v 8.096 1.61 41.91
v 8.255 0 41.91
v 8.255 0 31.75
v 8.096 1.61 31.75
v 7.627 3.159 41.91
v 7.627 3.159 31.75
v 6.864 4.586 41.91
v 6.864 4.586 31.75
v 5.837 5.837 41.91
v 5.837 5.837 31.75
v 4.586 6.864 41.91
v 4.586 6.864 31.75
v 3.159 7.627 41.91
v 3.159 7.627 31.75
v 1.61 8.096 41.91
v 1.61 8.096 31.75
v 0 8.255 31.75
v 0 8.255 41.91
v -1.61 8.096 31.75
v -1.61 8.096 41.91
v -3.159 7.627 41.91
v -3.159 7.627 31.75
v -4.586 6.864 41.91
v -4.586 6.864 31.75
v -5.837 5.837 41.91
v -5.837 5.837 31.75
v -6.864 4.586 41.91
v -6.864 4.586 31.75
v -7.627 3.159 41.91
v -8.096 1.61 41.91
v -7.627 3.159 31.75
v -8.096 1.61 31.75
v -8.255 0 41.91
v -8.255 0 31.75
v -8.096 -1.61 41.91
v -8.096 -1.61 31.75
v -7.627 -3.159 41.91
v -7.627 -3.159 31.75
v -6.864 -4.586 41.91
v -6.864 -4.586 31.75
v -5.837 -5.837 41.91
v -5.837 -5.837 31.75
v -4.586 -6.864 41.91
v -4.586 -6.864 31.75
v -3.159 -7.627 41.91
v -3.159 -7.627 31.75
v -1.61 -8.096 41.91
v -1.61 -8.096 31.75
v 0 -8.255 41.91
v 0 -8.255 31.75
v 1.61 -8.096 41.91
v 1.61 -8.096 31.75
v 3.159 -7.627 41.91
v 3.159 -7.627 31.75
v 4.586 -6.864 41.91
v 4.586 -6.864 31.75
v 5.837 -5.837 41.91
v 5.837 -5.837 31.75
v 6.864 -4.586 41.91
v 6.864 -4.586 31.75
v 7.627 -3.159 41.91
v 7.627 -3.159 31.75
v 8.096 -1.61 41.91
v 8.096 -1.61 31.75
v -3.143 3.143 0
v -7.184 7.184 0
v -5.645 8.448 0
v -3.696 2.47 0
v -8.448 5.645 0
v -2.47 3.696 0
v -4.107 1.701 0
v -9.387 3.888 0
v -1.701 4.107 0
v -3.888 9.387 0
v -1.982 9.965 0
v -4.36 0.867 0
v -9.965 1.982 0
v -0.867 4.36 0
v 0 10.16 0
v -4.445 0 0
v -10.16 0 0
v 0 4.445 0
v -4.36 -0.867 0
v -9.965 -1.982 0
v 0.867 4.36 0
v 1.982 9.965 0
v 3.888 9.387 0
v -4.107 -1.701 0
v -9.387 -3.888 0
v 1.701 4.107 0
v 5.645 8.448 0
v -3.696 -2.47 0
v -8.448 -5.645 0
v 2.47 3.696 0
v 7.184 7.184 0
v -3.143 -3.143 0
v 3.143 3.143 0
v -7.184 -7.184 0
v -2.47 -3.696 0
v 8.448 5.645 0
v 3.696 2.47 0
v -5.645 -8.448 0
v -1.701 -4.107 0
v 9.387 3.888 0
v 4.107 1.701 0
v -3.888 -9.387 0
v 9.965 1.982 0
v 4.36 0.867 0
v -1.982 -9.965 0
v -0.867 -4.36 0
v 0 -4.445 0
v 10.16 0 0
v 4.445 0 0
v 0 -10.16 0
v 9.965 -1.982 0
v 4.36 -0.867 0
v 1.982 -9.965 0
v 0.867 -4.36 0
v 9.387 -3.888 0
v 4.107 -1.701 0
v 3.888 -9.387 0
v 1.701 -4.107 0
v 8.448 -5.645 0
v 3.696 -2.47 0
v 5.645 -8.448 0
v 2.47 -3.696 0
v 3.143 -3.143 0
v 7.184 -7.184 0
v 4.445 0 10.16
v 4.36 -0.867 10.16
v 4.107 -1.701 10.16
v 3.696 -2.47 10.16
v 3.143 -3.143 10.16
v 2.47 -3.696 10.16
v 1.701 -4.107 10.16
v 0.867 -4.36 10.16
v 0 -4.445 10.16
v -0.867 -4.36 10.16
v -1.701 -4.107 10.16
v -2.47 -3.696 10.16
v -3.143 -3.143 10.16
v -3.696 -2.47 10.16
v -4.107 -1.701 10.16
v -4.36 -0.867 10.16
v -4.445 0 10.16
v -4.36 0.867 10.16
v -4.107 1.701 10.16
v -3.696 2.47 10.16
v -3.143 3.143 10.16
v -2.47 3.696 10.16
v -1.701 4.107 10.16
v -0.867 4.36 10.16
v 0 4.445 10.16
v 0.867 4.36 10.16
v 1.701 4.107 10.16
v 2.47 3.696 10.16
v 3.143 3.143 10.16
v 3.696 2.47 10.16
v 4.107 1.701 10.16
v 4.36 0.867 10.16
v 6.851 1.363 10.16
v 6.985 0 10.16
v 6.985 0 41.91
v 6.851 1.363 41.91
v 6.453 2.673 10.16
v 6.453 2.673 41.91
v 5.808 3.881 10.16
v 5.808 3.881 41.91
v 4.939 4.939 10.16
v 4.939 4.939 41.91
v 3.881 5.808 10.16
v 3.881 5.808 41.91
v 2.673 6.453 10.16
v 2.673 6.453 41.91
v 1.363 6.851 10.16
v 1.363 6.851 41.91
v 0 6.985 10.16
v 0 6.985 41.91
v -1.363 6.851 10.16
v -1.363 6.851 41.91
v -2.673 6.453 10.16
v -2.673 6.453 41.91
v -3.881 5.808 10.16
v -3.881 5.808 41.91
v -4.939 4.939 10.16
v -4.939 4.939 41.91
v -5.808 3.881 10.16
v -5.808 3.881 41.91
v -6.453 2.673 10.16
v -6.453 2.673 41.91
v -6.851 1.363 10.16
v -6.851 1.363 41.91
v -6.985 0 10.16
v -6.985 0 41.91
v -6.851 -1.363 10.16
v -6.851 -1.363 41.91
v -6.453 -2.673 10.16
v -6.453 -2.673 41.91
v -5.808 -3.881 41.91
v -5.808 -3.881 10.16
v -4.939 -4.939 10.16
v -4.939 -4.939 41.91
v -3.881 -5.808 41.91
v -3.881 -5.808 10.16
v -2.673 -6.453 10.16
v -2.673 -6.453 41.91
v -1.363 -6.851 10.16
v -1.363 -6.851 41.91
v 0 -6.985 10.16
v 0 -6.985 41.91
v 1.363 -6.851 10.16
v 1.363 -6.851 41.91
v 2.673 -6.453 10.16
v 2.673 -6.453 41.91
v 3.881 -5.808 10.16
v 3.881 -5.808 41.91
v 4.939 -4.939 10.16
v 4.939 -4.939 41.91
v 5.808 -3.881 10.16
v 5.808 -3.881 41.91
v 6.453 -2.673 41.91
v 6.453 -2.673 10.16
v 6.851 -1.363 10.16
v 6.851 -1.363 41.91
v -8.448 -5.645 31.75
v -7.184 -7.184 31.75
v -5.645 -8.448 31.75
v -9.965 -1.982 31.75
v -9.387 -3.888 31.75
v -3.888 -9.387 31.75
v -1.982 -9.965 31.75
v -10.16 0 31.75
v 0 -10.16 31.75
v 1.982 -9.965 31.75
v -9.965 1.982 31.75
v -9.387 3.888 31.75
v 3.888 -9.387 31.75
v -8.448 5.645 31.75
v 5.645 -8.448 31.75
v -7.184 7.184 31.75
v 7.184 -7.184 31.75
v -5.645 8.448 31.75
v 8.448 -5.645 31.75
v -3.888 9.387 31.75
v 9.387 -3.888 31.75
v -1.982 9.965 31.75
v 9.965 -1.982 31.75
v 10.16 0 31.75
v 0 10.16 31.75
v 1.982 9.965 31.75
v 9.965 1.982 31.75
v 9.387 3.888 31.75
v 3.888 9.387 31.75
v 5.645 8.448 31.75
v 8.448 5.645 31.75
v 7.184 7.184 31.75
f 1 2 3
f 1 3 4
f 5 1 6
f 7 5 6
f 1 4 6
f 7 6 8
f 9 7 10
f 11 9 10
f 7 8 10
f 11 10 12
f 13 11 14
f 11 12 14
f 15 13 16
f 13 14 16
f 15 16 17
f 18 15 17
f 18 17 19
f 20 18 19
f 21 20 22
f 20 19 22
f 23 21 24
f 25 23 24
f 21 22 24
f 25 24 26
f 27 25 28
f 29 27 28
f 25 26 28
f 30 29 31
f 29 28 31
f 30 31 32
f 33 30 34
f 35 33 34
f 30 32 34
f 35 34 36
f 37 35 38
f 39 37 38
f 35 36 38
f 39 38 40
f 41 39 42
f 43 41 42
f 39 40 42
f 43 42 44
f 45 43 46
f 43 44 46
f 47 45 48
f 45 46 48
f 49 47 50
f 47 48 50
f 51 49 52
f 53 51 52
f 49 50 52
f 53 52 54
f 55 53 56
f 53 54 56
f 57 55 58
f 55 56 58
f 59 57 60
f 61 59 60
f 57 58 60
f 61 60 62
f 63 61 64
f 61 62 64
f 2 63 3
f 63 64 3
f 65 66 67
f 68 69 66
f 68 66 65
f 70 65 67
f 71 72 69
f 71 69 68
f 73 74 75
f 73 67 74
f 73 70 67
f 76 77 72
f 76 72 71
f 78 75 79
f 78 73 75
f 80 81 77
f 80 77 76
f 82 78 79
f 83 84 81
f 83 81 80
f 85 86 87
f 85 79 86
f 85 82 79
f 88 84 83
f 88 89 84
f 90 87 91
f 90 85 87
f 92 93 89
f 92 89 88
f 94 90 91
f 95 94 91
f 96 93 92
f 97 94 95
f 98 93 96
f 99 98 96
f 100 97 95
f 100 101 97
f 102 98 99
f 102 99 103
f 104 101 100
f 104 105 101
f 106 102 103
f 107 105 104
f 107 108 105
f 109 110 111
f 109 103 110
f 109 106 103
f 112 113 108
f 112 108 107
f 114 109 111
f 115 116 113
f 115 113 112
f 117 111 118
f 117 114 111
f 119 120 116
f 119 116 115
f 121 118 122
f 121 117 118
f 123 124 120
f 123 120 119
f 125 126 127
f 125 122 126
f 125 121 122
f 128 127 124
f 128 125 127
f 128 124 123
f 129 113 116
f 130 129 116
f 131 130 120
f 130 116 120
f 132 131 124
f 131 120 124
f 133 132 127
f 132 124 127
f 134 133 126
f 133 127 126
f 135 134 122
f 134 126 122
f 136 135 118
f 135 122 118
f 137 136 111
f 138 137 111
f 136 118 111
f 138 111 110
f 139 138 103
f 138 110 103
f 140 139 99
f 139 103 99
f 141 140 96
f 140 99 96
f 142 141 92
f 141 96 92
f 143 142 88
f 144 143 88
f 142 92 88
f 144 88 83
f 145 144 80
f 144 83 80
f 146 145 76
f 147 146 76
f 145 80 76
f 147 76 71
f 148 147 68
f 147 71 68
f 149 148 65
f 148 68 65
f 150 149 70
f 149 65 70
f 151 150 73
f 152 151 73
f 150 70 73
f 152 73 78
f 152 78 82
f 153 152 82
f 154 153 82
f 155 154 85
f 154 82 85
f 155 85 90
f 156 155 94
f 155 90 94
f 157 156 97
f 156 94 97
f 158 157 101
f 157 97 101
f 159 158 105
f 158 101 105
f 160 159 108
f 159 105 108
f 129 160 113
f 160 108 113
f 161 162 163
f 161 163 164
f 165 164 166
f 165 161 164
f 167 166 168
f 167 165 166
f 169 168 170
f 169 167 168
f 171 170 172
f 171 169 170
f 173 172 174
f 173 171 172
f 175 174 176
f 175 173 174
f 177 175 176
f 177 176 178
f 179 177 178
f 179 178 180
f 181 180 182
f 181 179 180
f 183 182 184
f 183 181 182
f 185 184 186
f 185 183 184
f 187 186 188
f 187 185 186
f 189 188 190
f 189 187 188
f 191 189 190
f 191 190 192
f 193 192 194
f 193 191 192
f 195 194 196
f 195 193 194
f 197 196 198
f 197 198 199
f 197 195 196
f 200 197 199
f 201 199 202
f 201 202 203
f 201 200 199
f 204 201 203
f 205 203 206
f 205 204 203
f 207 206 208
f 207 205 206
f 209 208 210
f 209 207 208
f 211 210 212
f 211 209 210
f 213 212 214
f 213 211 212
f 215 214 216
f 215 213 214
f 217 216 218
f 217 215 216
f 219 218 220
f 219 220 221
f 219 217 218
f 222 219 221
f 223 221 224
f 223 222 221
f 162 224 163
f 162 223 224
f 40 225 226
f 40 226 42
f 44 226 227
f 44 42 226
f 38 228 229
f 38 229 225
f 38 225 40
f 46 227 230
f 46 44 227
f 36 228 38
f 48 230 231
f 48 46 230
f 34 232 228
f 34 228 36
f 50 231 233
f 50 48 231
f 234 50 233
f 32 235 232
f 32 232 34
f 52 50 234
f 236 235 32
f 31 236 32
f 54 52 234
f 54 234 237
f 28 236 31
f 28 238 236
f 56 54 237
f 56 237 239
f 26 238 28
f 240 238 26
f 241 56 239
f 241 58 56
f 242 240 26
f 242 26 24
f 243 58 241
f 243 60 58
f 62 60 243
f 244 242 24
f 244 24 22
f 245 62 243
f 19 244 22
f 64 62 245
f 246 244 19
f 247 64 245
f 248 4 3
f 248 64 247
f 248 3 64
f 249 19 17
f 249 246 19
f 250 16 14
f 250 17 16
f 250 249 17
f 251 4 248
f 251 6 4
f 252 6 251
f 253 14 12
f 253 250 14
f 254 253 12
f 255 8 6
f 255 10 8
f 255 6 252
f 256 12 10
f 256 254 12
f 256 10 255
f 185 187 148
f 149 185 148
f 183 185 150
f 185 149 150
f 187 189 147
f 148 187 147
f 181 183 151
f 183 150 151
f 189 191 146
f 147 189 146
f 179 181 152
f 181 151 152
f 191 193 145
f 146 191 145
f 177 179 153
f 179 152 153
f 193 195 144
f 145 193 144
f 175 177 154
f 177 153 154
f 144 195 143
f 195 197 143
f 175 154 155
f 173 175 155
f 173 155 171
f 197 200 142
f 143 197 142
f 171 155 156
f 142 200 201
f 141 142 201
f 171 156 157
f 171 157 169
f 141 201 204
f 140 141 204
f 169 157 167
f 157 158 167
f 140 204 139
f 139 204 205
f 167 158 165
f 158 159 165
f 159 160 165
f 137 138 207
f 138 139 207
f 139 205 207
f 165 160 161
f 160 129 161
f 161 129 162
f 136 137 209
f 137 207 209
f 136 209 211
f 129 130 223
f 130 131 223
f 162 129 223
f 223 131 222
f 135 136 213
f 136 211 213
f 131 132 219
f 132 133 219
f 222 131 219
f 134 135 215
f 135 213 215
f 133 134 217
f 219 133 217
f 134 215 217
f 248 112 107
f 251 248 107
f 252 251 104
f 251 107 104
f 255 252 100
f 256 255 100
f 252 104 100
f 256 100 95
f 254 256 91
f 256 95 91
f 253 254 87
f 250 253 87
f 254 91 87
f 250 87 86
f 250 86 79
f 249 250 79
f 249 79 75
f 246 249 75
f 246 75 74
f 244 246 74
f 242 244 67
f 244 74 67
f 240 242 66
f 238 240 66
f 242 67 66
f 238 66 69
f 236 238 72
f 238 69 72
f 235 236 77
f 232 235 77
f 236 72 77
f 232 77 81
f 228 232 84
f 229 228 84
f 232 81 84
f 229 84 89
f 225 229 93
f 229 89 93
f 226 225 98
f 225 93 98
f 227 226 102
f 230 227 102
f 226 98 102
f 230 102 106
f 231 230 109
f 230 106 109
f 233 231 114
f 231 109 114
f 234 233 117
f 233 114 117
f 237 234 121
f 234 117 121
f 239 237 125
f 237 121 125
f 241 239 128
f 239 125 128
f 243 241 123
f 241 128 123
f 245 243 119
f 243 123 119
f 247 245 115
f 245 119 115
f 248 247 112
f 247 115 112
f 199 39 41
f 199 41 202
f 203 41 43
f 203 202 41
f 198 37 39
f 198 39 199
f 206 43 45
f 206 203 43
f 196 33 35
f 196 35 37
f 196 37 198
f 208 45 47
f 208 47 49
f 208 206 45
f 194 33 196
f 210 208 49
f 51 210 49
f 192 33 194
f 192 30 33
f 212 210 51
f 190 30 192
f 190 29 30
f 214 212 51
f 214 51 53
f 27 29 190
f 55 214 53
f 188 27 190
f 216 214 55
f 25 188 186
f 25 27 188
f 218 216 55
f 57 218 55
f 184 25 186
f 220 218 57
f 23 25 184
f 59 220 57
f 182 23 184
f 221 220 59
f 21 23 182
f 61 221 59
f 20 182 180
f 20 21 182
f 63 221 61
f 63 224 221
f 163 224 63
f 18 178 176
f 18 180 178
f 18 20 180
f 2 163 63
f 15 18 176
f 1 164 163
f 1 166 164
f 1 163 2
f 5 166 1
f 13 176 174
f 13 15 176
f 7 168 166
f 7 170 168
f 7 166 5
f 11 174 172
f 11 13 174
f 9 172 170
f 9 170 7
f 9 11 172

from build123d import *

# Parameters (mm, degrees)
F0_R     = 10.16
F0_R_2   = 6.985
F1_DEPTH = 31.75
F2_R     = 8.255
F2_R_2   = 6.985
F3_DEPTH = 10.16
F4_R     = 6.985
F4_R_2   = 4.445
F5_DEPTH = 10.16


with BuildPart() as f1:
    # F0 (on Top) → F1 (new body)
    with BuildSketch(Plane.XY):
        Circle(F0_R)
        Circle(F0_R_2, mode=Mode.SUBTRACT)
    extrude(amount=F1_DEPTH)

    # F2 (on face) → F3 (join)
    with BuildSketch(Plane.XY.offset(31.75)):
        Circle(F2_R)
        Circle(F2_R_2, mode=Mode.SUBTRACT)
    extrude(amount=F3_DEPTH)

    # F4 (on face) → F5 (join)
    with BuildSketch(Plane(origin=(0, 0, 0), x_dir=(1, 0, 0), z_dir=(0, 0, -1))):
        Circle(F4_R)
        Circle(F4_R_2, mode=Mode.SUBTRACT)
    extrude(amount=-F5_DEPTH)


solid = f1.part
